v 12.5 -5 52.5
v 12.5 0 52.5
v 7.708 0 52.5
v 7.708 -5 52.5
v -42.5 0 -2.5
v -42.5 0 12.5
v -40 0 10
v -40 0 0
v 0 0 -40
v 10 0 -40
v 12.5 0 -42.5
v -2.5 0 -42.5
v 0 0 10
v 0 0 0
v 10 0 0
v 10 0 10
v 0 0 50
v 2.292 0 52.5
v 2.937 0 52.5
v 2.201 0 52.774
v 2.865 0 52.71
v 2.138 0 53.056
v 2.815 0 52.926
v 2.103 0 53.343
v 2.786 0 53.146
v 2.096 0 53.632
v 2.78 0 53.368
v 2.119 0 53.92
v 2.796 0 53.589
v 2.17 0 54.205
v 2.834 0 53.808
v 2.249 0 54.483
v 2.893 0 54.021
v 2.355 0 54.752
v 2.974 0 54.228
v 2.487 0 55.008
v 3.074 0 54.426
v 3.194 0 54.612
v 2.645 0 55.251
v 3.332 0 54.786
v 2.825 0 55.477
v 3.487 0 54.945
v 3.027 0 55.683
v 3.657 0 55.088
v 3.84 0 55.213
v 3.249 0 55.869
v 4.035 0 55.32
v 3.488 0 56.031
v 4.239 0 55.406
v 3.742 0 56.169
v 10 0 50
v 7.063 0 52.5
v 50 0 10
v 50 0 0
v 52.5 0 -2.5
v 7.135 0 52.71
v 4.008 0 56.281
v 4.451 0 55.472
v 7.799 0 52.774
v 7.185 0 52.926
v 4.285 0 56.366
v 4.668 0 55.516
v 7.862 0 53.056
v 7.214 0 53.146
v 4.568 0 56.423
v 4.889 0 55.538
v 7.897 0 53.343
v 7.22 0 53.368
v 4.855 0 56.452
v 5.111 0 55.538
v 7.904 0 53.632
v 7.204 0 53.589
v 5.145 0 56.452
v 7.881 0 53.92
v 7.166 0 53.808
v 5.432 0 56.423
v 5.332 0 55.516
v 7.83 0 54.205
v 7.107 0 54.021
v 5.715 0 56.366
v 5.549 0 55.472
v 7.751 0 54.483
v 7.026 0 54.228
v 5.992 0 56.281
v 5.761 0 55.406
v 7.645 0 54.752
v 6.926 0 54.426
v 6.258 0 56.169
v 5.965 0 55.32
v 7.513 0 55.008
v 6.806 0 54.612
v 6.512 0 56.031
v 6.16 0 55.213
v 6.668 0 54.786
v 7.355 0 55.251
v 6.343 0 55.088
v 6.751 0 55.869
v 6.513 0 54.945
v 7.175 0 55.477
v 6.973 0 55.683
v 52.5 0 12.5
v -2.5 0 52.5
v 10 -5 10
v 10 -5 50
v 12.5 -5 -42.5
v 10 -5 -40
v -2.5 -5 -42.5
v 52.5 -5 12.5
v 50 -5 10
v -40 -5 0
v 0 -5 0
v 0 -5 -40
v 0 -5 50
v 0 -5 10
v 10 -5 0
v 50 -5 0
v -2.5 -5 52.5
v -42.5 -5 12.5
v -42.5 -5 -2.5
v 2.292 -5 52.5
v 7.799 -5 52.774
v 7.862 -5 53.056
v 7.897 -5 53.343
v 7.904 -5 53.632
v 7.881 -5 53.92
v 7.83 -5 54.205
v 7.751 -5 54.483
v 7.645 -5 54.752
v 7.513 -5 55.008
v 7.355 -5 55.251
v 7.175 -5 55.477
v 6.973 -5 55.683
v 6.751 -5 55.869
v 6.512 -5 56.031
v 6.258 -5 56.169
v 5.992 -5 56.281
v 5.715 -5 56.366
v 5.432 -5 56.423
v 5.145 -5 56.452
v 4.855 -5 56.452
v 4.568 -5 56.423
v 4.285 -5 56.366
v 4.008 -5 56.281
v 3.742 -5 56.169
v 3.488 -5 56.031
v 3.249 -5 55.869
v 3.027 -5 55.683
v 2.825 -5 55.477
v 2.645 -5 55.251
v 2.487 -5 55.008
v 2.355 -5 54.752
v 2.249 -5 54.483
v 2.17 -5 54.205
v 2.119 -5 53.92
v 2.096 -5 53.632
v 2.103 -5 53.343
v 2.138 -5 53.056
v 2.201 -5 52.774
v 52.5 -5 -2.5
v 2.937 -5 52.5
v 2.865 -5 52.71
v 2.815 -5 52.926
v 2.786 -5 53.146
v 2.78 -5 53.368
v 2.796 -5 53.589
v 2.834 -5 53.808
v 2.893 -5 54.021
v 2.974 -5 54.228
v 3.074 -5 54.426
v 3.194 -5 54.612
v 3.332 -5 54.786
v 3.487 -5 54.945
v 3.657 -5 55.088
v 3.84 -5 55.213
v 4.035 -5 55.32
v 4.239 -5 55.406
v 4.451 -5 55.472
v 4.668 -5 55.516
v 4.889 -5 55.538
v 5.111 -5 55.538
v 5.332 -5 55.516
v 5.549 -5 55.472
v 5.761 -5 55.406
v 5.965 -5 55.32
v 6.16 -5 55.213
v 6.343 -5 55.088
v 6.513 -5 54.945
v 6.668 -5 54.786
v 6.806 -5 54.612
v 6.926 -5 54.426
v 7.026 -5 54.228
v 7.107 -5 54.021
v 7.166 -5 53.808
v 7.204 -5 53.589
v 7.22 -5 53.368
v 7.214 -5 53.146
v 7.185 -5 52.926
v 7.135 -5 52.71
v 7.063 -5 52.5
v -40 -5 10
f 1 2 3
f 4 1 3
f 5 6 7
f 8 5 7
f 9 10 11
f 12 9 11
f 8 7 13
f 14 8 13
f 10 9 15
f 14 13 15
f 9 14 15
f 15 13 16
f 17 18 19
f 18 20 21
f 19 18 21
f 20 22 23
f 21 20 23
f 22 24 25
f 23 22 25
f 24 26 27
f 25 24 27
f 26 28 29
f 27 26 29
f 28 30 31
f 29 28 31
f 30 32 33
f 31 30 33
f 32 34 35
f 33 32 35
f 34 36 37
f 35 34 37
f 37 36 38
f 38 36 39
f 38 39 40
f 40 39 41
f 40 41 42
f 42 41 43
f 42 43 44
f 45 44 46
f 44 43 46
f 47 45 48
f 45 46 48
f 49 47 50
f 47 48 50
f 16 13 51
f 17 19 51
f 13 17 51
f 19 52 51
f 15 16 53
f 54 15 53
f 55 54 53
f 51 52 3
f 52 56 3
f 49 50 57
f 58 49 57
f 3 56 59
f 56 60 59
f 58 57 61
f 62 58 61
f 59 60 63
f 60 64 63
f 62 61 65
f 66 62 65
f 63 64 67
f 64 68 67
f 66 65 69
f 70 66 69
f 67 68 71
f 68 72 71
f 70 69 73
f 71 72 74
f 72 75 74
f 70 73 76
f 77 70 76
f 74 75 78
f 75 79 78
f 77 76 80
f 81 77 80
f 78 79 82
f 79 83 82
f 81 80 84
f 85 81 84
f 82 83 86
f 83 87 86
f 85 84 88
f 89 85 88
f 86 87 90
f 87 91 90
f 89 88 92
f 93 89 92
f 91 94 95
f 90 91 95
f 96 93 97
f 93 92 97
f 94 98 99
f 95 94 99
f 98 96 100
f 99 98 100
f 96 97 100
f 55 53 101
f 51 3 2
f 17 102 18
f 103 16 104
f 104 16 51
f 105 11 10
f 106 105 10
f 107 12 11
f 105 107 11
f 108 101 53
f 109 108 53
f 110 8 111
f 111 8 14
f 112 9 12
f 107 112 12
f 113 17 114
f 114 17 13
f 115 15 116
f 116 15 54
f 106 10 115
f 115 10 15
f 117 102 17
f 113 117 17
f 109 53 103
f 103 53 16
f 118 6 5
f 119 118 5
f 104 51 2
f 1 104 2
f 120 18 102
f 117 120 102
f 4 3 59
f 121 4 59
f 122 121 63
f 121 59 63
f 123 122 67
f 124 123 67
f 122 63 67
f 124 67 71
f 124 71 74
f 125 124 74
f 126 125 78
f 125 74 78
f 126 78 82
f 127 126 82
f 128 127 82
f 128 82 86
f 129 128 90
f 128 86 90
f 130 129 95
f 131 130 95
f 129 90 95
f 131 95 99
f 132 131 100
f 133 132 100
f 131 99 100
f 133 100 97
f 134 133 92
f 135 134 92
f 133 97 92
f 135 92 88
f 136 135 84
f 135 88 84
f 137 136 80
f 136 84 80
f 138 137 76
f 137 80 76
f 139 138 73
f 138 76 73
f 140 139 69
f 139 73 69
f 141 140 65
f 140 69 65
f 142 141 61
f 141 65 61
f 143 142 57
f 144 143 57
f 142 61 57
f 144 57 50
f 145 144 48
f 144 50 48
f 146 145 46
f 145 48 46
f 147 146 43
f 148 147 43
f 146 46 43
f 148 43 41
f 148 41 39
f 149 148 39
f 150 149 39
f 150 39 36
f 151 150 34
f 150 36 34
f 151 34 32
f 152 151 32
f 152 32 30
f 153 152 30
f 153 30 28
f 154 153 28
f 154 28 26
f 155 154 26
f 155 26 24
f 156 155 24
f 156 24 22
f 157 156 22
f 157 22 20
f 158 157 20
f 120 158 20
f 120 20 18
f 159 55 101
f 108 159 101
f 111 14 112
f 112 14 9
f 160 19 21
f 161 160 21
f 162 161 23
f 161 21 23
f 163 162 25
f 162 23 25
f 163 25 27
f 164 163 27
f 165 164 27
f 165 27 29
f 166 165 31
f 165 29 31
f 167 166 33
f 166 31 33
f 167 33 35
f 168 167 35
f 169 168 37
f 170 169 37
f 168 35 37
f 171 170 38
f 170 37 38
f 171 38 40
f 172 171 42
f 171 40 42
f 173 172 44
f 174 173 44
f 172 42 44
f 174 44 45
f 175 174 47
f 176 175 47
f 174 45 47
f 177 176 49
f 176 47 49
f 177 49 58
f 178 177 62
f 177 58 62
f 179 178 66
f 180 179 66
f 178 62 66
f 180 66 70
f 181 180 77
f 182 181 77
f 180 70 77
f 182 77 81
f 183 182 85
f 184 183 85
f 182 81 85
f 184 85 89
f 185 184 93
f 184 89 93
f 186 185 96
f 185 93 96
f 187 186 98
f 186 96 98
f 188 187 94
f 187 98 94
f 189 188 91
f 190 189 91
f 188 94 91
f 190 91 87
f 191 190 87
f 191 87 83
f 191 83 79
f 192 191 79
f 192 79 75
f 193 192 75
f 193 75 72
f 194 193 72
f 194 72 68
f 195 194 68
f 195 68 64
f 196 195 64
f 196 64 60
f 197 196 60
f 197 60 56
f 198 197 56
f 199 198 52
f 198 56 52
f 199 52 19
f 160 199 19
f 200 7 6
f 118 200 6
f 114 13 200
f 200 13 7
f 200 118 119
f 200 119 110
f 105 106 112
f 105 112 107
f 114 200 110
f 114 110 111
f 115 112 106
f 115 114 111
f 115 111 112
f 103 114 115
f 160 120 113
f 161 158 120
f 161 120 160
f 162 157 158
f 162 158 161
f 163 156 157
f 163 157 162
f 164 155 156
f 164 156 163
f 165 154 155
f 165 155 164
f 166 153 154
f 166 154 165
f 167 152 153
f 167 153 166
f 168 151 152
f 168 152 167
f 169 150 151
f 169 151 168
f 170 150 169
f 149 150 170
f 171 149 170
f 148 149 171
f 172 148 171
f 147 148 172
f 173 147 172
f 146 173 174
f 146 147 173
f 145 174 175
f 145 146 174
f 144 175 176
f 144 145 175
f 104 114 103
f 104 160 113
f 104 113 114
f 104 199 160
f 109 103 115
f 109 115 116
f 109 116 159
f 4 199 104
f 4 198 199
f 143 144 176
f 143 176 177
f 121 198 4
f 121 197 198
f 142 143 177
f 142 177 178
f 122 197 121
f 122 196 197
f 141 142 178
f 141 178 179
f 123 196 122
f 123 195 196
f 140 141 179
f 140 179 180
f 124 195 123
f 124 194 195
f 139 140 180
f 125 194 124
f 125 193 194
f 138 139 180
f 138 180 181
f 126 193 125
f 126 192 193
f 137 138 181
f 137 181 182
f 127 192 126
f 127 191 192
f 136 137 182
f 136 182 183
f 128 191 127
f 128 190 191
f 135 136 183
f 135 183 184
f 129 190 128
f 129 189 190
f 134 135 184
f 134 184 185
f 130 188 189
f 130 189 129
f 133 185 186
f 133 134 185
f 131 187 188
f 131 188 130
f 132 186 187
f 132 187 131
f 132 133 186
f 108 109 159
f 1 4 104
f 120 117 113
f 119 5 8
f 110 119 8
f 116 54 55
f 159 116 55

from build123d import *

# Parameters (mm, degrees)
F1_DEPTH = 5


with BuildPart() as f1:
    # F0 (on Front) → F1 (new body)
    with BuildSketch(Plane.XZ):
        Polygon((10, 10), (10, 50), (12.5, 52.5), (7.707753, 52.5), (7.063372, 52.5), (2.936628, 52.5), (2.292247, 52.5), (-2.5, 52.5), (0, 50), (0, 10), (-40, 10), (-42.5, 12.5), (-42.5, -2.5), (-40, 0), (0, 0), (0, -40), (10, -40), (10, 0), (50, 0), (52.5, -2.5), (52.5, 12.5), (50, 10), align=None)
        with BuildLine():
            Line((7.063372, 52.5), (7.707753, 52.5))
            ThreePointArc((7.707753, 52.5), (5, 56.455801), (2.292247, 52.5))
            Line((2.292247, 52.5), (2.936628, 52.5))
            ThreePointArc((2.936628, 52.5), (5, 55.540565), (7.063372, 52.5))
        make_face()
        Polygon((12.5, -42.5), (10, -40), (0, -40), (-2.5, -42.5), align=None)
    extrude(amount=F1_DEPTH)


solid = f1.part
